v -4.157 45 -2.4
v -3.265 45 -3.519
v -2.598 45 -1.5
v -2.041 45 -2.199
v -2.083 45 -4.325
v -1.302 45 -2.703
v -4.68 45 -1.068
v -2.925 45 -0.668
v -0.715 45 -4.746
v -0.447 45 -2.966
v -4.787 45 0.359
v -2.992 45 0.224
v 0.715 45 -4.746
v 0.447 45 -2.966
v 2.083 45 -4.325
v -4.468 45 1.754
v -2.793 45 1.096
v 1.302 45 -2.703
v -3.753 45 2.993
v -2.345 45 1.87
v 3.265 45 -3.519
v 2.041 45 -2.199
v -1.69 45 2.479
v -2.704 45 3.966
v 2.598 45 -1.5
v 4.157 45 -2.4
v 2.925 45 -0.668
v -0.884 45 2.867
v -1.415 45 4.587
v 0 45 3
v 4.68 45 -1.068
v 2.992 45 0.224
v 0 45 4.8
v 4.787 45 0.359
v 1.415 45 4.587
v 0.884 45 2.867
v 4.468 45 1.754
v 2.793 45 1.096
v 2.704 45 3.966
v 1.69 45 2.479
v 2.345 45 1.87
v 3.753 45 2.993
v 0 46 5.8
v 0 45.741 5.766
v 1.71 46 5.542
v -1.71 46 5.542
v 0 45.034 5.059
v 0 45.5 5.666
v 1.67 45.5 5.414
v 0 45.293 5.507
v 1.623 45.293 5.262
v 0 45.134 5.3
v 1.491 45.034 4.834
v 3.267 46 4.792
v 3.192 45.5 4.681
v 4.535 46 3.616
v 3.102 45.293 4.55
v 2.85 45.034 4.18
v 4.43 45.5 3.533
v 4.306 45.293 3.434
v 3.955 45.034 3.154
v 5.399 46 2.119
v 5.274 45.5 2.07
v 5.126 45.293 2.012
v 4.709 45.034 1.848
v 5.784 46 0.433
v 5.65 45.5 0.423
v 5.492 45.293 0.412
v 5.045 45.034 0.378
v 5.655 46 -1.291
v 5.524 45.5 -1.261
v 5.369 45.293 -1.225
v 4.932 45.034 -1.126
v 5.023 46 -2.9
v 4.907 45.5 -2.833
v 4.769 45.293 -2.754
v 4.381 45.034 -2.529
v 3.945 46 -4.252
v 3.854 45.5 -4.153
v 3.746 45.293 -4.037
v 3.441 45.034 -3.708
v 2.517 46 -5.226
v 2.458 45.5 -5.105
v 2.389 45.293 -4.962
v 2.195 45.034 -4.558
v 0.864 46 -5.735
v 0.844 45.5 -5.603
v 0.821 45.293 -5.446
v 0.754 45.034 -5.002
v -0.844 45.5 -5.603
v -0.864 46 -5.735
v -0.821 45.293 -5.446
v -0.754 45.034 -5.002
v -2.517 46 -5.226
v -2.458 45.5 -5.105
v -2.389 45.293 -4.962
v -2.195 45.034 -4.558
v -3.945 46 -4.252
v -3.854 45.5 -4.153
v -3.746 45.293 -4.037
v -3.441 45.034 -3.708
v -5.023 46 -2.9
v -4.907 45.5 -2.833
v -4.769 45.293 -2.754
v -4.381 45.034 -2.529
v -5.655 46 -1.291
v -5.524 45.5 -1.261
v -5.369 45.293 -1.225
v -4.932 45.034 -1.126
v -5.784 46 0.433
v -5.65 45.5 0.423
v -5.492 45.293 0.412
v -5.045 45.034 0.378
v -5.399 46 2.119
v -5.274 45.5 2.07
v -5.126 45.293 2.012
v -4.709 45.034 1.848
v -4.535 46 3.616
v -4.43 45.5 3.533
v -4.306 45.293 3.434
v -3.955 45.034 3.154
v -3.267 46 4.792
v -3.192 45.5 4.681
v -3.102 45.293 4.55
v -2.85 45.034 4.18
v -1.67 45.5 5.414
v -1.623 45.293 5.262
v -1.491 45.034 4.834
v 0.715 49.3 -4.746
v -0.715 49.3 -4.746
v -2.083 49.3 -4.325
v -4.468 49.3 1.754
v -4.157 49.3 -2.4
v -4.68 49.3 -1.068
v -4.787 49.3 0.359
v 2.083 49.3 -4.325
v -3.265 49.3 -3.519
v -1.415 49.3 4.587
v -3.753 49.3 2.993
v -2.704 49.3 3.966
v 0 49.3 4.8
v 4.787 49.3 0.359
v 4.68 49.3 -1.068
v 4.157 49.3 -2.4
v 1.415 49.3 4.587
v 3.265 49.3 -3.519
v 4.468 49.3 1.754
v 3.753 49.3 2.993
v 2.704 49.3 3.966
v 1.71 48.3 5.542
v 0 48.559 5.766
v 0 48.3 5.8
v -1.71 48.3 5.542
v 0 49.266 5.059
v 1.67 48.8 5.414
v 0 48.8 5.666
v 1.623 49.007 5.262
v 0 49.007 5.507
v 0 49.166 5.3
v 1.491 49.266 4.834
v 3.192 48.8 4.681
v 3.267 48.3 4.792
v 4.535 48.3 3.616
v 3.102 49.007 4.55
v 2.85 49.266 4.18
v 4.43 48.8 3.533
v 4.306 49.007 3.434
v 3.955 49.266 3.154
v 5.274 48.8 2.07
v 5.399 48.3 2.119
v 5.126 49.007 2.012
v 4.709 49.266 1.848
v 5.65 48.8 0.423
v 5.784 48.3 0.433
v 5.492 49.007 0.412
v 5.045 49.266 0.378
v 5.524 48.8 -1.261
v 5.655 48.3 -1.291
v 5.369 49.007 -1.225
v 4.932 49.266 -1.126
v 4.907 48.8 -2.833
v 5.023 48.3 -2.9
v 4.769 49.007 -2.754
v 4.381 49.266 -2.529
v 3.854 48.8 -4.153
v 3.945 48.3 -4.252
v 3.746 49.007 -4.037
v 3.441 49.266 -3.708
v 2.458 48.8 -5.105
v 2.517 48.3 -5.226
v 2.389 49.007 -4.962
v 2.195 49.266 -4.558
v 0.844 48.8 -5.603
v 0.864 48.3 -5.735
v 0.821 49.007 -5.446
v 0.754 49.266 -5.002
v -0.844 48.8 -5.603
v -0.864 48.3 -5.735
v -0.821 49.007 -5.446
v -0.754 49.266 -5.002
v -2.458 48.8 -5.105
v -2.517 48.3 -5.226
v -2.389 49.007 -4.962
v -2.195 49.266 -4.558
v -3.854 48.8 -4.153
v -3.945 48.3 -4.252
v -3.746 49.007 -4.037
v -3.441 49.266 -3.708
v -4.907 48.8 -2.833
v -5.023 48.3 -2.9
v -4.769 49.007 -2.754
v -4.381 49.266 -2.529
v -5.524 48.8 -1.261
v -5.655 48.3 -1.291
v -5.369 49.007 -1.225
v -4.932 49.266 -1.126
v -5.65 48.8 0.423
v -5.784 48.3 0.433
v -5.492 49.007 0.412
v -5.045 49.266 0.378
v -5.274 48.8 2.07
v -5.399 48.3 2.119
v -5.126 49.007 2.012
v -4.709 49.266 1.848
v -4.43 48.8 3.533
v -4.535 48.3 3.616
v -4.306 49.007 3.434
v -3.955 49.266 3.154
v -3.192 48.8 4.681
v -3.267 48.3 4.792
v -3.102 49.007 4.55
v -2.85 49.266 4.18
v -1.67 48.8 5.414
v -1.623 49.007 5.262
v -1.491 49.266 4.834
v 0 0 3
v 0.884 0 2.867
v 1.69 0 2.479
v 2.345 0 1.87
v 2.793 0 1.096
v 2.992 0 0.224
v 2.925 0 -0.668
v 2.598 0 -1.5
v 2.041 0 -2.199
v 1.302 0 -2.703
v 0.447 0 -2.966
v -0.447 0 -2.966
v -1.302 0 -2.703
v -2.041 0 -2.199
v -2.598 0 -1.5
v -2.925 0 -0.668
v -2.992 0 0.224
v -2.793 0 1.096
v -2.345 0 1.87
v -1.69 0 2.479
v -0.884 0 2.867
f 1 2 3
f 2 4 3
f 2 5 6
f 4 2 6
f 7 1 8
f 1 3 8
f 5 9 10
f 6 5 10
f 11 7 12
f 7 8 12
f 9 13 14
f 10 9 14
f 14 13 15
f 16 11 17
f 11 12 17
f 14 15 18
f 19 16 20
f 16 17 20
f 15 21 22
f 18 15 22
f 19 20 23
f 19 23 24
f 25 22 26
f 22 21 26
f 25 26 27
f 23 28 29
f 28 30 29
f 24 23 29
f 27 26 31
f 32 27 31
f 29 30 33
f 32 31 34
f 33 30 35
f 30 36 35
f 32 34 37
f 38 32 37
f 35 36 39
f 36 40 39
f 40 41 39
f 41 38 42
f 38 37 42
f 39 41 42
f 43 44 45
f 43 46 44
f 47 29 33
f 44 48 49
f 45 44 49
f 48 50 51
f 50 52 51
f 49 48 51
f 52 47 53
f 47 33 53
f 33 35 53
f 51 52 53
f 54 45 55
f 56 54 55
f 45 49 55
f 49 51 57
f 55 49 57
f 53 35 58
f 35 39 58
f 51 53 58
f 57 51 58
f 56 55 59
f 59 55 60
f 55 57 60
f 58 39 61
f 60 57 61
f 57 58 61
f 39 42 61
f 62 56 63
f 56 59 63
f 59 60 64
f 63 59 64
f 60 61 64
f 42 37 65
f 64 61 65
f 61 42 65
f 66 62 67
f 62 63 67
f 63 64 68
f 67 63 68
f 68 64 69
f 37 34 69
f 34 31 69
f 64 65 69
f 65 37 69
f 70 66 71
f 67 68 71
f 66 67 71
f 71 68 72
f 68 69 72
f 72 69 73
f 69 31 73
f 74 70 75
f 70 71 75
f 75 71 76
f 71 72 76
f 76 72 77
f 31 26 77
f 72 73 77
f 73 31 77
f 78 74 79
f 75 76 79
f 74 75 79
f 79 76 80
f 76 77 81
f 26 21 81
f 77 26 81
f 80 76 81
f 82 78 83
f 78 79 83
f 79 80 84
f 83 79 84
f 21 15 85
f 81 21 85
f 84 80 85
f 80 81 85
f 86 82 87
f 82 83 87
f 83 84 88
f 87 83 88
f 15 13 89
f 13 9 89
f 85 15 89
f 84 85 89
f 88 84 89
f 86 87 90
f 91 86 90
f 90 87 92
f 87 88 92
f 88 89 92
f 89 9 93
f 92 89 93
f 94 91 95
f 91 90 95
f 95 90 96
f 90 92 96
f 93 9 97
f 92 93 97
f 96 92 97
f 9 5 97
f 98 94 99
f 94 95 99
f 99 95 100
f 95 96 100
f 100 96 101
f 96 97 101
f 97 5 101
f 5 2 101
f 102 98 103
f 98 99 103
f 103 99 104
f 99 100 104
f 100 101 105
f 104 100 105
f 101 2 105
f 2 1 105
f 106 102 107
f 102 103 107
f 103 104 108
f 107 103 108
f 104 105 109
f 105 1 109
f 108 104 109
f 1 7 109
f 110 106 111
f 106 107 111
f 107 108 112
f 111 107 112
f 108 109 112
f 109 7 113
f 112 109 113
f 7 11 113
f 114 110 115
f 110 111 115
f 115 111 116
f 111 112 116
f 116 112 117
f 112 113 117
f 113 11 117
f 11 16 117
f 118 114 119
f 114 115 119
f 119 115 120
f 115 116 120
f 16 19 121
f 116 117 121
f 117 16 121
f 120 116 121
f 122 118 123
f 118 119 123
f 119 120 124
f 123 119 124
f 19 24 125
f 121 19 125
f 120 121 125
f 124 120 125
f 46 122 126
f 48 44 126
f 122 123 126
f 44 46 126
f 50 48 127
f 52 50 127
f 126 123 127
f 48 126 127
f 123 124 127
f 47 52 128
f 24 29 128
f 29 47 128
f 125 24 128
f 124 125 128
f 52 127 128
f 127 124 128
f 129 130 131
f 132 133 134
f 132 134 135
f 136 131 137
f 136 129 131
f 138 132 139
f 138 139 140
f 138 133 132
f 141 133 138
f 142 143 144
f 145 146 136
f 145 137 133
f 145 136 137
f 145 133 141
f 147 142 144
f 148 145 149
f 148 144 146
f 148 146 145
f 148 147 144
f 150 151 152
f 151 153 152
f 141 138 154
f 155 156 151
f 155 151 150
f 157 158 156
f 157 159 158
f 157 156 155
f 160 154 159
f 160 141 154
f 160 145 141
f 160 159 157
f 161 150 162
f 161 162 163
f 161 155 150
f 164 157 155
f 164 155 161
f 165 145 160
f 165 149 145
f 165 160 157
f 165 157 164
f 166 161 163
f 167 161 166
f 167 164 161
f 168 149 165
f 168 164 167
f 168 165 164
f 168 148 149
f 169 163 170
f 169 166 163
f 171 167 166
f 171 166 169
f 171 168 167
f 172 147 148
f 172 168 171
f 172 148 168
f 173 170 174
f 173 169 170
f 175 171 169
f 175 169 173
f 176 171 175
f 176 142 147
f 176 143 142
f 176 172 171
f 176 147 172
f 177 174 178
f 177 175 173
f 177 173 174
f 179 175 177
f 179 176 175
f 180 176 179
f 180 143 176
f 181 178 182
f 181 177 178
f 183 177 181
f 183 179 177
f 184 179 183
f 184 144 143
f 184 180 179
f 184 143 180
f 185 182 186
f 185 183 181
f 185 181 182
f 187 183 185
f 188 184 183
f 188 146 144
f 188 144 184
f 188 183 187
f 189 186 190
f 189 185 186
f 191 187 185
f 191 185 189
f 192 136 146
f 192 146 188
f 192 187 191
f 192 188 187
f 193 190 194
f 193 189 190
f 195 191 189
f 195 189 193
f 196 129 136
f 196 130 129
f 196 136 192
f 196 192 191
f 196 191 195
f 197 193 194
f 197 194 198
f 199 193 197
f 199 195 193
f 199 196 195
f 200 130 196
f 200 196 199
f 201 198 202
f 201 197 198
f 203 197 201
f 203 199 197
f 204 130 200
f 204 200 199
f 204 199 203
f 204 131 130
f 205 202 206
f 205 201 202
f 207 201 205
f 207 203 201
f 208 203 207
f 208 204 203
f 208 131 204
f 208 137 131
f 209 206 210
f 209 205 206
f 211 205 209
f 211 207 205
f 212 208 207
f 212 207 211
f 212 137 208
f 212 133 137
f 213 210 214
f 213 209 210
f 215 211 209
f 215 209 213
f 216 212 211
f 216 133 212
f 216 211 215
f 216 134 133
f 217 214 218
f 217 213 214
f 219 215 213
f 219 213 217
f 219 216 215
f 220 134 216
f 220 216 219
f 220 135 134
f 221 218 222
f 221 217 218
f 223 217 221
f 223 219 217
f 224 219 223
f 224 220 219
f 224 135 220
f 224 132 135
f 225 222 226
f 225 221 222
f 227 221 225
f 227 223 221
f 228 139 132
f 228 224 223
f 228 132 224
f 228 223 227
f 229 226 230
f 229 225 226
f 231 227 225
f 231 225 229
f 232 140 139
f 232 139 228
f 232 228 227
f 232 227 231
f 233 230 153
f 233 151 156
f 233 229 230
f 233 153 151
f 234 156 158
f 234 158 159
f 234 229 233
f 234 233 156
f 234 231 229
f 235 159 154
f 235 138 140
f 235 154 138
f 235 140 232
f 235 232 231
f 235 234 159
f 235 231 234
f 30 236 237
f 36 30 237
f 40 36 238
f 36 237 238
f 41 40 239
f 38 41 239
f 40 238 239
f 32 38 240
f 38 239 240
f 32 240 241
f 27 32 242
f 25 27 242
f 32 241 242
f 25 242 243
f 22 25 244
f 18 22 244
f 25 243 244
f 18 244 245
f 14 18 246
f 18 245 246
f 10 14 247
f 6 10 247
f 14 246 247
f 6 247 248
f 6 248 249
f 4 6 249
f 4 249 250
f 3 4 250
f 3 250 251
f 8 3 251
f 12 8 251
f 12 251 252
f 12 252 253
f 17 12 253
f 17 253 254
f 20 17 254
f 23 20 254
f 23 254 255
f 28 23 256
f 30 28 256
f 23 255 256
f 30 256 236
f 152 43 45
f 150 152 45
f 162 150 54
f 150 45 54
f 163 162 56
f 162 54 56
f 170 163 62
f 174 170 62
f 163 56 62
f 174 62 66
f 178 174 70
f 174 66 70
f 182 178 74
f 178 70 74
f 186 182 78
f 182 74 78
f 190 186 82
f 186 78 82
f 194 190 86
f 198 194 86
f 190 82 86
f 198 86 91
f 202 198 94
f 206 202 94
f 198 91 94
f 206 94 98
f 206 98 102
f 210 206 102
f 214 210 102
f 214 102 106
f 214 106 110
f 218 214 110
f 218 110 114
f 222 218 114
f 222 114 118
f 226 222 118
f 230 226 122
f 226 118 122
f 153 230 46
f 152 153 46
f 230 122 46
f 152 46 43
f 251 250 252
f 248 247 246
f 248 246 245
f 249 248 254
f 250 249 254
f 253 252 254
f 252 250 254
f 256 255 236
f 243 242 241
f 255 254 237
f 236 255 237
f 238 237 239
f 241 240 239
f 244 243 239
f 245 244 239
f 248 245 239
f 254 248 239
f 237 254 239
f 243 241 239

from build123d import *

# Parameters (mm, degrees)
SKETCH1_R           = 3
BOSS_EXTRUDE1_DEPTH = 45
SKETCH2_R           = 5.8
BOSS_EXTRUDE2_DEPTH = 4.3
FILLET1_R           = 1


with BuildPart() as part:
    # Sketch1 → Boss-Extrude1 (new body)
    with BuildSketch(Plane(origin=(0, 0, 0), x_dir=(1, 0, 0), z_dir=(0, 1, 0))):
        with Locations(Location((0, 0, 0), (0, 0, 270))):  # turned: the seam where the file's is
            Circle(SKETCH1_R)
    extrude(amount=BOSS_EXTRUDE1_DEPTH)

    # Sketch2 → Boss-Extrude2 (add)
    with BuildSketch(Plane(origin=(0, 45, 0), x_dir=(1, 0, 0), z_dir=(0, 1, 0))):
        with Locations(Location((0, 0, 0), (0, 0, 270))):  # turned: the seam where the file's is
            Circle(SKETCH2_R)
    extrude(amount=BOSS_EXTRUDE2_DEPTH)

    # Fillet1
    fillet1_edges = [part.edges().sort_by_distance(p)[0] for p in [
        (0, 45, -5.8),
        (0, 49.3, -5.8),
    ]]
    fillet(fillet1_edges, radius=FILLET1_R)


solid = part.part
